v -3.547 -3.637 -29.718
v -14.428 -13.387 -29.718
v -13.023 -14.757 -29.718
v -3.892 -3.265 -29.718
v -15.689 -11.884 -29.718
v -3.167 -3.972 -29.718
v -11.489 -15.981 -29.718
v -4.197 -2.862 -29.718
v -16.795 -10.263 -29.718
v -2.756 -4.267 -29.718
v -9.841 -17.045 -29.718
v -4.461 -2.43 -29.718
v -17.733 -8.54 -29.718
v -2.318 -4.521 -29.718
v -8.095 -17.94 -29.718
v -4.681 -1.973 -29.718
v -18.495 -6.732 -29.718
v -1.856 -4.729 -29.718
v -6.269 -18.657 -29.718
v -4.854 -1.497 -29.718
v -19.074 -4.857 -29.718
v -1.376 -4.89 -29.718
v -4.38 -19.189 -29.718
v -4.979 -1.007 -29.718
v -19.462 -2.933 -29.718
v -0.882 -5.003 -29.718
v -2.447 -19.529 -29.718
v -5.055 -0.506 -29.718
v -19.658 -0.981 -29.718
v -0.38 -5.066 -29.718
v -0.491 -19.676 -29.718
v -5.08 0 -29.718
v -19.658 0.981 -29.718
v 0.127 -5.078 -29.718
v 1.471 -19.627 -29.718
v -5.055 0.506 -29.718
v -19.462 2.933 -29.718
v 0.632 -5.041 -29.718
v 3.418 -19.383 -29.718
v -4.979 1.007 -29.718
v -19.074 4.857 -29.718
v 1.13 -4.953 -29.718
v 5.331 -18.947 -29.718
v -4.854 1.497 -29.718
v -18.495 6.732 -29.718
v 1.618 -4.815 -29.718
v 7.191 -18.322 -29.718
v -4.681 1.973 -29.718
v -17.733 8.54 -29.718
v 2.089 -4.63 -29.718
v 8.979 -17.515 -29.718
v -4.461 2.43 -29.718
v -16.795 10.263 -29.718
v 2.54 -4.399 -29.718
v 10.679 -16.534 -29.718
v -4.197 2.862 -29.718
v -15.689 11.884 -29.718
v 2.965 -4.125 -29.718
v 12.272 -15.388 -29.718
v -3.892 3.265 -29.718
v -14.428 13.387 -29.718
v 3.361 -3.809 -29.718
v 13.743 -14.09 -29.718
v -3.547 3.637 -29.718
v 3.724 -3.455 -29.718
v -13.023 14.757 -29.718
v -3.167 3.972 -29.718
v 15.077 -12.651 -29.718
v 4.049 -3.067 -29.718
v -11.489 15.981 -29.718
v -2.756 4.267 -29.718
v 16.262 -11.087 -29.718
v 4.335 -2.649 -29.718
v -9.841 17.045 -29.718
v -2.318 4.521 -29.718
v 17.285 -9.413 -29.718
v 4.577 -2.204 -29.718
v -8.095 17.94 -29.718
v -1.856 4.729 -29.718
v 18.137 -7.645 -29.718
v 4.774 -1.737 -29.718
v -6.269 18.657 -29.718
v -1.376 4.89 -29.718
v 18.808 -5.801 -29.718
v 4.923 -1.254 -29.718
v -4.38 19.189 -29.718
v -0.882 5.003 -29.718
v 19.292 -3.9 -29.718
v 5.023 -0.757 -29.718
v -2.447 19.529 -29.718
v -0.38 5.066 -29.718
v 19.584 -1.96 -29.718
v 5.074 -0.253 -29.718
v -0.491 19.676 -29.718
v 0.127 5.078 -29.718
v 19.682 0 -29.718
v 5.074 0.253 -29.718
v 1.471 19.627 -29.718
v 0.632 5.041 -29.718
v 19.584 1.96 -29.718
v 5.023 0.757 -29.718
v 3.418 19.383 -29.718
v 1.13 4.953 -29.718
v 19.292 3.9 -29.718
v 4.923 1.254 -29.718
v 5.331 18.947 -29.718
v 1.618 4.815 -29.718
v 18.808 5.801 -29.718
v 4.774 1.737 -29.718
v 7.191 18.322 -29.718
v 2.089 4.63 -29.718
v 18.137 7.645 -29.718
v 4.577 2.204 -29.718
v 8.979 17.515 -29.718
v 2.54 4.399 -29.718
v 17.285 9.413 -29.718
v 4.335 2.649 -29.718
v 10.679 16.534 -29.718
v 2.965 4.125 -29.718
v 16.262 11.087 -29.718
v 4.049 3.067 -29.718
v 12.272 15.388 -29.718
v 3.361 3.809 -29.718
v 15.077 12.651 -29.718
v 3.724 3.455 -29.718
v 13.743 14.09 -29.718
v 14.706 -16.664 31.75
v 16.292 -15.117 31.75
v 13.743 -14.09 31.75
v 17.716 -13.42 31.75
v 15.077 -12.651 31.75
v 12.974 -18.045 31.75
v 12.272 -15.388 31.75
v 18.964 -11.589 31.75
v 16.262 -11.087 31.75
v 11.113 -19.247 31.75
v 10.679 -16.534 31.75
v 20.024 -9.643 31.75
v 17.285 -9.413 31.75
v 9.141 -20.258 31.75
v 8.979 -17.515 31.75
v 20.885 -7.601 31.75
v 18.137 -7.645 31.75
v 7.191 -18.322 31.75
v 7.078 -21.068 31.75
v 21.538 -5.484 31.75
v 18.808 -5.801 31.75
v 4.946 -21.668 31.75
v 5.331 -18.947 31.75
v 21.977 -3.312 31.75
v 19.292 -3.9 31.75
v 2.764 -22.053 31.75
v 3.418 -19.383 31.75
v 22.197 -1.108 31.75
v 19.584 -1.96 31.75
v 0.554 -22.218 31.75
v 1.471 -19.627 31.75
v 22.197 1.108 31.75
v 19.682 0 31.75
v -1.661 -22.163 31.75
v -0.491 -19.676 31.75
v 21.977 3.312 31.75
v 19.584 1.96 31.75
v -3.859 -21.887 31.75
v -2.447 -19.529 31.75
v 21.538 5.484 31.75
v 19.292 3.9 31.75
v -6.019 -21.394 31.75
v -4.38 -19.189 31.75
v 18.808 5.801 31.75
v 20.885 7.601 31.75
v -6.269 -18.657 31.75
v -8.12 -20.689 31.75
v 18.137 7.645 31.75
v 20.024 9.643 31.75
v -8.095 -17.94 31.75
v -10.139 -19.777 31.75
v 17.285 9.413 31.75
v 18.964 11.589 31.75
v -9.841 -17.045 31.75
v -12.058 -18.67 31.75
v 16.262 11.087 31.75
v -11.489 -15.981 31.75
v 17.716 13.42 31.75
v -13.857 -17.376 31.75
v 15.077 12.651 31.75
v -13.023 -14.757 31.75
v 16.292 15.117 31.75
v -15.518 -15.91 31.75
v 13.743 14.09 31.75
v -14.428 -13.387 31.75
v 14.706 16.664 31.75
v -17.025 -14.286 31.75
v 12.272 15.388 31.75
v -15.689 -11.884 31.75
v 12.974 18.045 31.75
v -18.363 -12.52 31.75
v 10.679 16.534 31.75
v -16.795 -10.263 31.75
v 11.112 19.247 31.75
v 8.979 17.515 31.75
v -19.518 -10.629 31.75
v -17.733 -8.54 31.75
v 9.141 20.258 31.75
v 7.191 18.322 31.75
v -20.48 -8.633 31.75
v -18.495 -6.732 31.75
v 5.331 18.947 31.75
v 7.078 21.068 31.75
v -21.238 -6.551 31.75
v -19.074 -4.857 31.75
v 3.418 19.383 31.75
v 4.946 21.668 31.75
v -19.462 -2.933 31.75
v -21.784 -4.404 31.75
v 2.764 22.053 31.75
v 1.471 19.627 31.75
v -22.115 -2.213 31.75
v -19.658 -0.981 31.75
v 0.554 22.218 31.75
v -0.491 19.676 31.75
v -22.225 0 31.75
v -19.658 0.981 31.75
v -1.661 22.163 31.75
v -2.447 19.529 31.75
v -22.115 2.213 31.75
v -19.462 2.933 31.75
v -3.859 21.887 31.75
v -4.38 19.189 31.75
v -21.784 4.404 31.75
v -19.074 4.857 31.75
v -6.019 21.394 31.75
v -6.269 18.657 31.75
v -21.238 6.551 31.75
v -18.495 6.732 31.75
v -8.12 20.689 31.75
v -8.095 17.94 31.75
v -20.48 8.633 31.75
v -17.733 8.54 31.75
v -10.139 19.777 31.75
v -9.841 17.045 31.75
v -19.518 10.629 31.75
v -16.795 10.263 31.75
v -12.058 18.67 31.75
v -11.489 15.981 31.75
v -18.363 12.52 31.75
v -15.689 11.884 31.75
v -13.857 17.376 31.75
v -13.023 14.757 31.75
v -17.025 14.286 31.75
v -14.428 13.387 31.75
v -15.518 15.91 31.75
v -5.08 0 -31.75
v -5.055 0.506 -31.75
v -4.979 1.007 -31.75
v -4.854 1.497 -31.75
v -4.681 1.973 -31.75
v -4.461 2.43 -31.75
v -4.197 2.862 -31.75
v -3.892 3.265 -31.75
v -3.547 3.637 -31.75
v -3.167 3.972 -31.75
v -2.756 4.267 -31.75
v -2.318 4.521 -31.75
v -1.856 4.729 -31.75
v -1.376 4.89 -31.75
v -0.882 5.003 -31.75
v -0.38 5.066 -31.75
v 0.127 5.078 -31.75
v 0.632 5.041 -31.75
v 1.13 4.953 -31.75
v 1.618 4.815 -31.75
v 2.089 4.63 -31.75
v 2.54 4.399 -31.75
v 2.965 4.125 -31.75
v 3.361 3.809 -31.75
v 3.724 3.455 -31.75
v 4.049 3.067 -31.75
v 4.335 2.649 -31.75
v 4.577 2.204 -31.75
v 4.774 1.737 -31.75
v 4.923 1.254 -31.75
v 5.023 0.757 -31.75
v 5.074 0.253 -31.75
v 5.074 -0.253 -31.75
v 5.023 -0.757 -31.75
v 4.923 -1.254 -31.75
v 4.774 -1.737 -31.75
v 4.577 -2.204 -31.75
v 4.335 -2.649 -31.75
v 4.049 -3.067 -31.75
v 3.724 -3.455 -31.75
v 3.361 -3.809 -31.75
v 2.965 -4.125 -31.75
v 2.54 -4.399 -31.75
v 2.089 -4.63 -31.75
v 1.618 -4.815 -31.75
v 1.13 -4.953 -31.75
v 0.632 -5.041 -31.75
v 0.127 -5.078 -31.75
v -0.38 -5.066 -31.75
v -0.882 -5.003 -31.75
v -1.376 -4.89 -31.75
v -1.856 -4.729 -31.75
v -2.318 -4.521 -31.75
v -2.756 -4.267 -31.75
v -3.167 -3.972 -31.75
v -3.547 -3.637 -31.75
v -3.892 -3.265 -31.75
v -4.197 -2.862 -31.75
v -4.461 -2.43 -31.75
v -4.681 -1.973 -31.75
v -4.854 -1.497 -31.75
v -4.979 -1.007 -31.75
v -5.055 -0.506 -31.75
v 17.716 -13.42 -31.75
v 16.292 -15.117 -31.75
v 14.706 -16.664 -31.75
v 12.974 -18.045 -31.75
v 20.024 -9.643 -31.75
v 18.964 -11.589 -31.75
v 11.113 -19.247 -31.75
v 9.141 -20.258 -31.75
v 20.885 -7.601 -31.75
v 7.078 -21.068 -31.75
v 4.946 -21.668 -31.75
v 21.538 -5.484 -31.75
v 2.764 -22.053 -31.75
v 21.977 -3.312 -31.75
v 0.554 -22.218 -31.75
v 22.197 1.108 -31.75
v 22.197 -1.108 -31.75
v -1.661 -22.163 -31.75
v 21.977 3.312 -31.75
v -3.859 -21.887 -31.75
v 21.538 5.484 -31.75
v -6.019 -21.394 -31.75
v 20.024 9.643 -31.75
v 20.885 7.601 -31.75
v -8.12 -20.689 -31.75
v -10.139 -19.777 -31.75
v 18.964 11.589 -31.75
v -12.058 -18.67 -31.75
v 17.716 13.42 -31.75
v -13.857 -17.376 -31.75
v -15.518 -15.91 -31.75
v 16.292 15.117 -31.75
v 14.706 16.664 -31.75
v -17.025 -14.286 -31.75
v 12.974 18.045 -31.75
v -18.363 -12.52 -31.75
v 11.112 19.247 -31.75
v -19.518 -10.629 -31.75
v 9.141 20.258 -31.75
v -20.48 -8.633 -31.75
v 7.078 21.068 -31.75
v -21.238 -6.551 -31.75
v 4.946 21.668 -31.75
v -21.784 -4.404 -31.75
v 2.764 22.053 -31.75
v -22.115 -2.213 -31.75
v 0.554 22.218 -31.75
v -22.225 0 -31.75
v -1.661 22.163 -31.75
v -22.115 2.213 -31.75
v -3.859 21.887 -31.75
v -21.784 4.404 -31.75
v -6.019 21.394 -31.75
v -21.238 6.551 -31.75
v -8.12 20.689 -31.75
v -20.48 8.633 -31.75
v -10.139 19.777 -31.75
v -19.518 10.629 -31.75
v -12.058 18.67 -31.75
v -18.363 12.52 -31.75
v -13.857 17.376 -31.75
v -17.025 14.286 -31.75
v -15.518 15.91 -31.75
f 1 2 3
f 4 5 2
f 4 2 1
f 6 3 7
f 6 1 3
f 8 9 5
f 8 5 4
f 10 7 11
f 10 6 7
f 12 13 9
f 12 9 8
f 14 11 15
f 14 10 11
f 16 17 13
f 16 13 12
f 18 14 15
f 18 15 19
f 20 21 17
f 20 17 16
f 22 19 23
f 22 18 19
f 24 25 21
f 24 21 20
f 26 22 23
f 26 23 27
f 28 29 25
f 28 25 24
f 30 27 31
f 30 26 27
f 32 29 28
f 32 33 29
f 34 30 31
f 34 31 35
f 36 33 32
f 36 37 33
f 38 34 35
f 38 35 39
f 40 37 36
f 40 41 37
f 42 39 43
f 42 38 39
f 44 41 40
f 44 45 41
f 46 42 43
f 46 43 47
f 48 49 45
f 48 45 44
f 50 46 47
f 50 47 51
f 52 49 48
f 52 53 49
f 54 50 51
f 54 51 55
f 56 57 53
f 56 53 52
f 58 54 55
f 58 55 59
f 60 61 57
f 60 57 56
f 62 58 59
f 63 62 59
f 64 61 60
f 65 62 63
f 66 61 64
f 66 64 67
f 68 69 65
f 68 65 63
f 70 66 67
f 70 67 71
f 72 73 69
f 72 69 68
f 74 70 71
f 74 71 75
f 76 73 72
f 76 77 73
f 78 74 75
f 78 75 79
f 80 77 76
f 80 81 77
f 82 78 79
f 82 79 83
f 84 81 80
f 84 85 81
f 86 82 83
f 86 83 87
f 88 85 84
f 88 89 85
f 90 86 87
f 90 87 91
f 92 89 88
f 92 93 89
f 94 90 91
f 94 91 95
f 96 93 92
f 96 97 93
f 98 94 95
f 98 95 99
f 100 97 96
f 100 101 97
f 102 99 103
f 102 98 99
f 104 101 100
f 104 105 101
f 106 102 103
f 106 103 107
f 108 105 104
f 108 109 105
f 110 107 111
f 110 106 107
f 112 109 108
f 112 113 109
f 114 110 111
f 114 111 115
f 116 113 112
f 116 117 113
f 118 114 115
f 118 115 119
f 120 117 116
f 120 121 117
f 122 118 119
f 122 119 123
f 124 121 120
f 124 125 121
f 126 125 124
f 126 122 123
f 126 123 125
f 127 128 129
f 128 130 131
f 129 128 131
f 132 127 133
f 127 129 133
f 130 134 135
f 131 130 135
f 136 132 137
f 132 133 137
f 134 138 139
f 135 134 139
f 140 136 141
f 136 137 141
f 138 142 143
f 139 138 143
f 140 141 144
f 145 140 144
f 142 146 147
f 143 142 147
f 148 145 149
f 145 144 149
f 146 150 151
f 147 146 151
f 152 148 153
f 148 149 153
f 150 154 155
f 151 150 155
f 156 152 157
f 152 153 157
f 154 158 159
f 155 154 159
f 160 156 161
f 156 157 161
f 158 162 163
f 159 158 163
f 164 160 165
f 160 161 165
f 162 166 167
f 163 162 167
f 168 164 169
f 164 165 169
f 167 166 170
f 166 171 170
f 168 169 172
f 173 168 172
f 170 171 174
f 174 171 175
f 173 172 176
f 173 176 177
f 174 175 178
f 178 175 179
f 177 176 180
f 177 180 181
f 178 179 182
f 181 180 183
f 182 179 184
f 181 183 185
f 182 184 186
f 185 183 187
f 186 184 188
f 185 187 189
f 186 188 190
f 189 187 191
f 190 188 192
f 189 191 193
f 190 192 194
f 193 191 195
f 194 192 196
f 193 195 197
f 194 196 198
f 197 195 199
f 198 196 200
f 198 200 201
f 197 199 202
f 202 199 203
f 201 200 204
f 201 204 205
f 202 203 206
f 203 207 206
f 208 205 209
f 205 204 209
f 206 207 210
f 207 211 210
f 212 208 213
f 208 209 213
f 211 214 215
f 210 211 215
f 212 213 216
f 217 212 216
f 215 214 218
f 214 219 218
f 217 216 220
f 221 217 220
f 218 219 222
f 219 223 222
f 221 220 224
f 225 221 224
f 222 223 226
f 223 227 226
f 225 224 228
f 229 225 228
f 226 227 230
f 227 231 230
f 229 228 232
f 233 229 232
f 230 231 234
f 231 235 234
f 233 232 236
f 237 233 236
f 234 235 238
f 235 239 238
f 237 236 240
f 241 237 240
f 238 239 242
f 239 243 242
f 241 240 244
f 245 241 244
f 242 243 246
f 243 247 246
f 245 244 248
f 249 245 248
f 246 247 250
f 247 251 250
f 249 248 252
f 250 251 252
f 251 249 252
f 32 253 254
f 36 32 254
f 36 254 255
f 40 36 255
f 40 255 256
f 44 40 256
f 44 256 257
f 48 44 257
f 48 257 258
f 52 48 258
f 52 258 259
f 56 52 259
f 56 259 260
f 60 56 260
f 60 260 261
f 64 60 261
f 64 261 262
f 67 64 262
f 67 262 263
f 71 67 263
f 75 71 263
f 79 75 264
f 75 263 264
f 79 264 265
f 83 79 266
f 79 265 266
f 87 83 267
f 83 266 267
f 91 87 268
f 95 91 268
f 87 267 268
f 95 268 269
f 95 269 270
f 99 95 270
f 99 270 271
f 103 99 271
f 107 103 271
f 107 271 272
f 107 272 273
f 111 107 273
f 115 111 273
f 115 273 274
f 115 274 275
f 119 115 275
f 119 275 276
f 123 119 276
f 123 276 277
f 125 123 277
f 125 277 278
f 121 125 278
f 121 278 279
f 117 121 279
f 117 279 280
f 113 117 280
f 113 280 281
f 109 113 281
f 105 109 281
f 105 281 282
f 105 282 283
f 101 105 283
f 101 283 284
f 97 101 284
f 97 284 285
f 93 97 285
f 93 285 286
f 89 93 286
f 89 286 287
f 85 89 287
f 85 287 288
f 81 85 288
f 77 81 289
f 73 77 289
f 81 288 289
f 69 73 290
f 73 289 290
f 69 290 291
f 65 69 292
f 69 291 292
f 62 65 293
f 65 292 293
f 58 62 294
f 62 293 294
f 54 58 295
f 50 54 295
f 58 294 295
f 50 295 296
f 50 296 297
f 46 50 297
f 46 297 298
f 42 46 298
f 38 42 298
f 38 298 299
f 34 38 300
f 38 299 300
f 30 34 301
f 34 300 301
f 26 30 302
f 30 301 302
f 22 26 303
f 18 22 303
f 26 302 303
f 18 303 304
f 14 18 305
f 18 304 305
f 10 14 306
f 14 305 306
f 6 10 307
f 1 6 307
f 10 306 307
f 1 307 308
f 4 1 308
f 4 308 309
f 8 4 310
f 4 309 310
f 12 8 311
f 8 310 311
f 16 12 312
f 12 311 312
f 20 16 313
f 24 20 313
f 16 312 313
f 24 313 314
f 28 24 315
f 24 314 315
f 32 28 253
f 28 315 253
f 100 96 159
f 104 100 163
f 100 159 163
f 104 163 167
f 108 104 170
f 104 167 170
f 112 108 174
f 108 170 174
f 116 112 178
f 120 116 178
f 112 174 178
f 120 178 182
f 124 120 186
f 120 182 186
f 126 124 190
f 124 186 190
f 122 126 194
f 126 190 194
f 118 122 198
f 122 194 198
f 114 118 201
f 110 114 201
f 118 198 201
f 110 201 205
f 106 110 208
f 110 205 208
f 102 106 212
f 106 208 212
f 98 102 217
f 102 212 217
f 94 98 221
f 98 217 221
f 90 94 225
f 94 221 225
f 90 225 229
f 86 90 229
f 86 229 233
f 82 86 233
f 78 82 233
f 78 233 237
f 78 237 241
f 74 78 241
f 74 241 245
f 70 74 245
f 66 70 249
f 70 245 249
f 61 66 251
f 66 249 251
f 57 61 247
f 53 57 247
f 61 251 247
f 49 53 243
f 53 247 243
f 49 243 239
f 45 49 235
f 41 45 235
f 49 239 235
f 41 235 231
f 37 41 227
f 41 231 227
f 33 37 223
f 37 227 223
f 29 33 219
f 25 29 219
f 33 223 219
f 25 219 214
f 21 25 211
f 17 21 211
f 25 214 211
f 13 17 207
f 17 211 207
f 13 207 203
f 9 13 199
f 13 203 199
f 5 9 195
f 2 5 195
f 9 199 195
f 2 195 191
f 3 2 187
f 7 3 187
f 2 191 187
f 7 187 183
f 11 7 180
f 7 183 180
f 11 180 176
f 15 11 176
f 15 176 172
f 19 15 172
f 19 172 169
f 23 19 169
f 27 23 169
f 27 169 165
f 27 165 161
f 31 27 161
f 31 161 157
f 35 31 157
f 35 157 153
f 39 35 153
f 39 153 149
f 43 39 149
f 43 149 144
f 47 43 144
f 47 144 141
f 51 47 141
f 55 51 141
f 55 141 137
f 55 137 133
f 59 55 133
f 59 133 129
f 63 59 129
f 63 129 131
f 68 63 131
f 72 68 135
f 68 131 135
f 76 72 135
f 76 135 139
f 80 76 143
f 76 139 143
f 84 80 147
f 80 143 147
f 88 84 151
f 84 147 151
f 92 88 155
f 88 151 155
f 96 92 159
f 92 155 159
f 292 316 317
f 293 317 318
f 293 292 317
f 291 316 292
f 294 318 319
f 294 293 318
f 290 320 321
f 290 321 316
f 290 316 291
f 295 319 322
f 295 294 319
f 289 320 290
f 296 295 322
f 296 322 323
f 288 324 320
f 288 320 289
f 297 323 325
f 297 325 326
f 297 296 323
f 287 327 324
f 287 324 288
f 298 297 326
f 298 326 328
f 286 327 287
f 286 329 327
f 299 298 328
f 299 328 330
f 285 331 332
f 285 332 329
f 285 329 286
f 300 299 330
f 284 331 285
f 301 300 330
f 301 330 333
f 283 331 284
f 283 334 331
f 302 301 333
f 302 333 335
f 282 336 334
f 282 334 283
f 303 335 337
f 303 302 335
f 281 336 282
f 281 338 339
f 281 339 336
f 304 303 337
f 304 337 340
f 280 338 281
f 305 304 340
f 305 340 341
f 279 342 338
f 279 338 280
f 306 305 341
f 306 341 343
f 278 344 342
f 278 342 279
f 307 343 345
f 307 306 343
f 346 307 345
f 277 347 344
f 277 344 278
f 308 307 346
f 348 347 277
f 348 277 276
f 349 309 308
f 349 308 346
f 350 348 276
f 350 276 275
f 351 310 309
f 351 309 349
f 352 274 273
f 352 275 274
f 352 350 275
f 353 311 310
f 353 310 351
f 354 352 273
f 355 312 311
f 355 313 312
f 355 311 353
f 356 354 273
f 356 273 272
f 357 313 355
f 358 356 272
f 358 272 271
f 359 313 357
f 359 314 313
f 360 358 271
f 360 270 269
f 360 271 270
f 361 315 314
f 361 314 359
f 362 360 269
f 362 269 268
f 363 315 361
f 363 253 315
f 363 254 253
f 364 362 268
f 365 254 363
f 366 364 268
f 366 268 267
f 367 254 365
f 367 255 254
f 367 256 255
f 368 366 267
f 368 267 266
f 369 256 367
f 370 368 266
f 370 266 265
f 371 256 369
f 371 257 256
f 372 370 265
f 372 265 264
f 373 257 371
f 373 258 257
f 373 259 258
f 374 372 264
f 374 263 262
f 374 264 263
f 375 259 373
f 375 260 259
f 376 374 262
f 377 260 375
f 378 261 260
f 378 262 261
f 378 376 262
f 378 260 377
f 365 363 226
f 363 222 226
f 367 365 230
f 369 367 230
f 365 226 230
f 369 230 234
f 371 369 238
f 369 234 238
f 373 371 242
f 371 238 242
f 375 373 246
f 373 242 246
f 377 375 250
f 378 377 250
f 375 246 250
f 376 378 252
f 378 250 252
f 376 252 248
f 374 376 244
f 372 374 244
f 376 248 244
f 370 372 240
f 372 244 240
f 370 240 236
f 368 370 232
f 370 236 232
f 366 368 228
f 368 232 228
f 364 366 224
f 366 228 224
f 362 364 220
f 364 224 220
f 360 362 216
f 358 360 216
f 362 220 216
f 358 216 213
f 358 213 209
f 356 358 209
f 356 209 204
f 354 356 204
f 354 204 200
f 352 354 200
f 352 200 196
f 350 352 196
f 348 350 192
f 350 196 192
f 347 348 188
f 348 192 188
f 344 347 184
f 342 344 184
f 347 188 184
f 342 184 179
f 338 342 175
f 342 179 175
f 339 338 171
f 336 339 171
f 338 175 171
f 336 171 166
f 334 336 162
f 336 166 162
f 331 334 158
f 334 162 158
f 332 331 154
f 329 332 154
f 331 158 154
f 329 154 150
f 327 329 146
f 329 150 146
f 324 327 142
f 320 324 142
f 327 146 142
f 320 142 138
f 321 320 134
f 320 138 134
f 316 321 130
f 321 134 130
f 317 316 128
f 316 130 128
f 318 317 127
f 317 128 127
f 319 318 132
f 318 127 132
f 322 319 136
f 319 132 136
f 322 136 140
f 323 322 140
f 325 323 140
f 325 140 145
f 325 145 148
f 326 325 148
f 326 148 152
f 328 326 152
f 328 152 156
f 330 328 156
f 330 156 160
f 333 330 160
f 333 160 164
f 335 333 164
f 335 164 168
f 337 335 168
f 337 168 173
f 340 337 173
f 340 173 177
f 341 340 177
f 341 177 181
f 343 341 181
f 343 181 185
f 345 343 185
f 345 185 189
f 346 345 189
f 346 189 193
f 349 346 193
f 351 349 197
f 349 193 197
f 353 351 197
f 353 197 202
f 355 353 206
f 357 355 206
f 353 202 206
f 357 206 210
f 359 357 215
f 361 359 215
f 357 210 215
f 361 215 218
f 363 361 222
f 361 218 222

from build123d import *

# Parameters (mm, degrees)
F0_W     = 22.225
F0_H     = 63.5
F3_D     = 10.16
F2_R     = 19.682221
F4_DEPTH = 61.468


with BuildPart() as f1:
    # F0 (on Front) → F1 (revolve)
    with BuildSketch(Plane.XZ):
        with Locations((-11.1125, 0)):
            Rectangle(F0_W, F0_H)
    revolve(axis=Axis((0, 0, 0), (0, 0, -1)))

    # F3 (through all)
    with Locations(Plane.XY.offset(31.75)):
        with Locations((0, 0)):
            Hole(F3_D / 2)

    # F2 (on face) → F4 (cut)
    with BuildSketch(Plane.XY.offset(31.75)):
        Circle(F2_R)
    extrude(amount=-F4_DEPTH, mode=Mode.SUBTRACT)


solid = f1.part
